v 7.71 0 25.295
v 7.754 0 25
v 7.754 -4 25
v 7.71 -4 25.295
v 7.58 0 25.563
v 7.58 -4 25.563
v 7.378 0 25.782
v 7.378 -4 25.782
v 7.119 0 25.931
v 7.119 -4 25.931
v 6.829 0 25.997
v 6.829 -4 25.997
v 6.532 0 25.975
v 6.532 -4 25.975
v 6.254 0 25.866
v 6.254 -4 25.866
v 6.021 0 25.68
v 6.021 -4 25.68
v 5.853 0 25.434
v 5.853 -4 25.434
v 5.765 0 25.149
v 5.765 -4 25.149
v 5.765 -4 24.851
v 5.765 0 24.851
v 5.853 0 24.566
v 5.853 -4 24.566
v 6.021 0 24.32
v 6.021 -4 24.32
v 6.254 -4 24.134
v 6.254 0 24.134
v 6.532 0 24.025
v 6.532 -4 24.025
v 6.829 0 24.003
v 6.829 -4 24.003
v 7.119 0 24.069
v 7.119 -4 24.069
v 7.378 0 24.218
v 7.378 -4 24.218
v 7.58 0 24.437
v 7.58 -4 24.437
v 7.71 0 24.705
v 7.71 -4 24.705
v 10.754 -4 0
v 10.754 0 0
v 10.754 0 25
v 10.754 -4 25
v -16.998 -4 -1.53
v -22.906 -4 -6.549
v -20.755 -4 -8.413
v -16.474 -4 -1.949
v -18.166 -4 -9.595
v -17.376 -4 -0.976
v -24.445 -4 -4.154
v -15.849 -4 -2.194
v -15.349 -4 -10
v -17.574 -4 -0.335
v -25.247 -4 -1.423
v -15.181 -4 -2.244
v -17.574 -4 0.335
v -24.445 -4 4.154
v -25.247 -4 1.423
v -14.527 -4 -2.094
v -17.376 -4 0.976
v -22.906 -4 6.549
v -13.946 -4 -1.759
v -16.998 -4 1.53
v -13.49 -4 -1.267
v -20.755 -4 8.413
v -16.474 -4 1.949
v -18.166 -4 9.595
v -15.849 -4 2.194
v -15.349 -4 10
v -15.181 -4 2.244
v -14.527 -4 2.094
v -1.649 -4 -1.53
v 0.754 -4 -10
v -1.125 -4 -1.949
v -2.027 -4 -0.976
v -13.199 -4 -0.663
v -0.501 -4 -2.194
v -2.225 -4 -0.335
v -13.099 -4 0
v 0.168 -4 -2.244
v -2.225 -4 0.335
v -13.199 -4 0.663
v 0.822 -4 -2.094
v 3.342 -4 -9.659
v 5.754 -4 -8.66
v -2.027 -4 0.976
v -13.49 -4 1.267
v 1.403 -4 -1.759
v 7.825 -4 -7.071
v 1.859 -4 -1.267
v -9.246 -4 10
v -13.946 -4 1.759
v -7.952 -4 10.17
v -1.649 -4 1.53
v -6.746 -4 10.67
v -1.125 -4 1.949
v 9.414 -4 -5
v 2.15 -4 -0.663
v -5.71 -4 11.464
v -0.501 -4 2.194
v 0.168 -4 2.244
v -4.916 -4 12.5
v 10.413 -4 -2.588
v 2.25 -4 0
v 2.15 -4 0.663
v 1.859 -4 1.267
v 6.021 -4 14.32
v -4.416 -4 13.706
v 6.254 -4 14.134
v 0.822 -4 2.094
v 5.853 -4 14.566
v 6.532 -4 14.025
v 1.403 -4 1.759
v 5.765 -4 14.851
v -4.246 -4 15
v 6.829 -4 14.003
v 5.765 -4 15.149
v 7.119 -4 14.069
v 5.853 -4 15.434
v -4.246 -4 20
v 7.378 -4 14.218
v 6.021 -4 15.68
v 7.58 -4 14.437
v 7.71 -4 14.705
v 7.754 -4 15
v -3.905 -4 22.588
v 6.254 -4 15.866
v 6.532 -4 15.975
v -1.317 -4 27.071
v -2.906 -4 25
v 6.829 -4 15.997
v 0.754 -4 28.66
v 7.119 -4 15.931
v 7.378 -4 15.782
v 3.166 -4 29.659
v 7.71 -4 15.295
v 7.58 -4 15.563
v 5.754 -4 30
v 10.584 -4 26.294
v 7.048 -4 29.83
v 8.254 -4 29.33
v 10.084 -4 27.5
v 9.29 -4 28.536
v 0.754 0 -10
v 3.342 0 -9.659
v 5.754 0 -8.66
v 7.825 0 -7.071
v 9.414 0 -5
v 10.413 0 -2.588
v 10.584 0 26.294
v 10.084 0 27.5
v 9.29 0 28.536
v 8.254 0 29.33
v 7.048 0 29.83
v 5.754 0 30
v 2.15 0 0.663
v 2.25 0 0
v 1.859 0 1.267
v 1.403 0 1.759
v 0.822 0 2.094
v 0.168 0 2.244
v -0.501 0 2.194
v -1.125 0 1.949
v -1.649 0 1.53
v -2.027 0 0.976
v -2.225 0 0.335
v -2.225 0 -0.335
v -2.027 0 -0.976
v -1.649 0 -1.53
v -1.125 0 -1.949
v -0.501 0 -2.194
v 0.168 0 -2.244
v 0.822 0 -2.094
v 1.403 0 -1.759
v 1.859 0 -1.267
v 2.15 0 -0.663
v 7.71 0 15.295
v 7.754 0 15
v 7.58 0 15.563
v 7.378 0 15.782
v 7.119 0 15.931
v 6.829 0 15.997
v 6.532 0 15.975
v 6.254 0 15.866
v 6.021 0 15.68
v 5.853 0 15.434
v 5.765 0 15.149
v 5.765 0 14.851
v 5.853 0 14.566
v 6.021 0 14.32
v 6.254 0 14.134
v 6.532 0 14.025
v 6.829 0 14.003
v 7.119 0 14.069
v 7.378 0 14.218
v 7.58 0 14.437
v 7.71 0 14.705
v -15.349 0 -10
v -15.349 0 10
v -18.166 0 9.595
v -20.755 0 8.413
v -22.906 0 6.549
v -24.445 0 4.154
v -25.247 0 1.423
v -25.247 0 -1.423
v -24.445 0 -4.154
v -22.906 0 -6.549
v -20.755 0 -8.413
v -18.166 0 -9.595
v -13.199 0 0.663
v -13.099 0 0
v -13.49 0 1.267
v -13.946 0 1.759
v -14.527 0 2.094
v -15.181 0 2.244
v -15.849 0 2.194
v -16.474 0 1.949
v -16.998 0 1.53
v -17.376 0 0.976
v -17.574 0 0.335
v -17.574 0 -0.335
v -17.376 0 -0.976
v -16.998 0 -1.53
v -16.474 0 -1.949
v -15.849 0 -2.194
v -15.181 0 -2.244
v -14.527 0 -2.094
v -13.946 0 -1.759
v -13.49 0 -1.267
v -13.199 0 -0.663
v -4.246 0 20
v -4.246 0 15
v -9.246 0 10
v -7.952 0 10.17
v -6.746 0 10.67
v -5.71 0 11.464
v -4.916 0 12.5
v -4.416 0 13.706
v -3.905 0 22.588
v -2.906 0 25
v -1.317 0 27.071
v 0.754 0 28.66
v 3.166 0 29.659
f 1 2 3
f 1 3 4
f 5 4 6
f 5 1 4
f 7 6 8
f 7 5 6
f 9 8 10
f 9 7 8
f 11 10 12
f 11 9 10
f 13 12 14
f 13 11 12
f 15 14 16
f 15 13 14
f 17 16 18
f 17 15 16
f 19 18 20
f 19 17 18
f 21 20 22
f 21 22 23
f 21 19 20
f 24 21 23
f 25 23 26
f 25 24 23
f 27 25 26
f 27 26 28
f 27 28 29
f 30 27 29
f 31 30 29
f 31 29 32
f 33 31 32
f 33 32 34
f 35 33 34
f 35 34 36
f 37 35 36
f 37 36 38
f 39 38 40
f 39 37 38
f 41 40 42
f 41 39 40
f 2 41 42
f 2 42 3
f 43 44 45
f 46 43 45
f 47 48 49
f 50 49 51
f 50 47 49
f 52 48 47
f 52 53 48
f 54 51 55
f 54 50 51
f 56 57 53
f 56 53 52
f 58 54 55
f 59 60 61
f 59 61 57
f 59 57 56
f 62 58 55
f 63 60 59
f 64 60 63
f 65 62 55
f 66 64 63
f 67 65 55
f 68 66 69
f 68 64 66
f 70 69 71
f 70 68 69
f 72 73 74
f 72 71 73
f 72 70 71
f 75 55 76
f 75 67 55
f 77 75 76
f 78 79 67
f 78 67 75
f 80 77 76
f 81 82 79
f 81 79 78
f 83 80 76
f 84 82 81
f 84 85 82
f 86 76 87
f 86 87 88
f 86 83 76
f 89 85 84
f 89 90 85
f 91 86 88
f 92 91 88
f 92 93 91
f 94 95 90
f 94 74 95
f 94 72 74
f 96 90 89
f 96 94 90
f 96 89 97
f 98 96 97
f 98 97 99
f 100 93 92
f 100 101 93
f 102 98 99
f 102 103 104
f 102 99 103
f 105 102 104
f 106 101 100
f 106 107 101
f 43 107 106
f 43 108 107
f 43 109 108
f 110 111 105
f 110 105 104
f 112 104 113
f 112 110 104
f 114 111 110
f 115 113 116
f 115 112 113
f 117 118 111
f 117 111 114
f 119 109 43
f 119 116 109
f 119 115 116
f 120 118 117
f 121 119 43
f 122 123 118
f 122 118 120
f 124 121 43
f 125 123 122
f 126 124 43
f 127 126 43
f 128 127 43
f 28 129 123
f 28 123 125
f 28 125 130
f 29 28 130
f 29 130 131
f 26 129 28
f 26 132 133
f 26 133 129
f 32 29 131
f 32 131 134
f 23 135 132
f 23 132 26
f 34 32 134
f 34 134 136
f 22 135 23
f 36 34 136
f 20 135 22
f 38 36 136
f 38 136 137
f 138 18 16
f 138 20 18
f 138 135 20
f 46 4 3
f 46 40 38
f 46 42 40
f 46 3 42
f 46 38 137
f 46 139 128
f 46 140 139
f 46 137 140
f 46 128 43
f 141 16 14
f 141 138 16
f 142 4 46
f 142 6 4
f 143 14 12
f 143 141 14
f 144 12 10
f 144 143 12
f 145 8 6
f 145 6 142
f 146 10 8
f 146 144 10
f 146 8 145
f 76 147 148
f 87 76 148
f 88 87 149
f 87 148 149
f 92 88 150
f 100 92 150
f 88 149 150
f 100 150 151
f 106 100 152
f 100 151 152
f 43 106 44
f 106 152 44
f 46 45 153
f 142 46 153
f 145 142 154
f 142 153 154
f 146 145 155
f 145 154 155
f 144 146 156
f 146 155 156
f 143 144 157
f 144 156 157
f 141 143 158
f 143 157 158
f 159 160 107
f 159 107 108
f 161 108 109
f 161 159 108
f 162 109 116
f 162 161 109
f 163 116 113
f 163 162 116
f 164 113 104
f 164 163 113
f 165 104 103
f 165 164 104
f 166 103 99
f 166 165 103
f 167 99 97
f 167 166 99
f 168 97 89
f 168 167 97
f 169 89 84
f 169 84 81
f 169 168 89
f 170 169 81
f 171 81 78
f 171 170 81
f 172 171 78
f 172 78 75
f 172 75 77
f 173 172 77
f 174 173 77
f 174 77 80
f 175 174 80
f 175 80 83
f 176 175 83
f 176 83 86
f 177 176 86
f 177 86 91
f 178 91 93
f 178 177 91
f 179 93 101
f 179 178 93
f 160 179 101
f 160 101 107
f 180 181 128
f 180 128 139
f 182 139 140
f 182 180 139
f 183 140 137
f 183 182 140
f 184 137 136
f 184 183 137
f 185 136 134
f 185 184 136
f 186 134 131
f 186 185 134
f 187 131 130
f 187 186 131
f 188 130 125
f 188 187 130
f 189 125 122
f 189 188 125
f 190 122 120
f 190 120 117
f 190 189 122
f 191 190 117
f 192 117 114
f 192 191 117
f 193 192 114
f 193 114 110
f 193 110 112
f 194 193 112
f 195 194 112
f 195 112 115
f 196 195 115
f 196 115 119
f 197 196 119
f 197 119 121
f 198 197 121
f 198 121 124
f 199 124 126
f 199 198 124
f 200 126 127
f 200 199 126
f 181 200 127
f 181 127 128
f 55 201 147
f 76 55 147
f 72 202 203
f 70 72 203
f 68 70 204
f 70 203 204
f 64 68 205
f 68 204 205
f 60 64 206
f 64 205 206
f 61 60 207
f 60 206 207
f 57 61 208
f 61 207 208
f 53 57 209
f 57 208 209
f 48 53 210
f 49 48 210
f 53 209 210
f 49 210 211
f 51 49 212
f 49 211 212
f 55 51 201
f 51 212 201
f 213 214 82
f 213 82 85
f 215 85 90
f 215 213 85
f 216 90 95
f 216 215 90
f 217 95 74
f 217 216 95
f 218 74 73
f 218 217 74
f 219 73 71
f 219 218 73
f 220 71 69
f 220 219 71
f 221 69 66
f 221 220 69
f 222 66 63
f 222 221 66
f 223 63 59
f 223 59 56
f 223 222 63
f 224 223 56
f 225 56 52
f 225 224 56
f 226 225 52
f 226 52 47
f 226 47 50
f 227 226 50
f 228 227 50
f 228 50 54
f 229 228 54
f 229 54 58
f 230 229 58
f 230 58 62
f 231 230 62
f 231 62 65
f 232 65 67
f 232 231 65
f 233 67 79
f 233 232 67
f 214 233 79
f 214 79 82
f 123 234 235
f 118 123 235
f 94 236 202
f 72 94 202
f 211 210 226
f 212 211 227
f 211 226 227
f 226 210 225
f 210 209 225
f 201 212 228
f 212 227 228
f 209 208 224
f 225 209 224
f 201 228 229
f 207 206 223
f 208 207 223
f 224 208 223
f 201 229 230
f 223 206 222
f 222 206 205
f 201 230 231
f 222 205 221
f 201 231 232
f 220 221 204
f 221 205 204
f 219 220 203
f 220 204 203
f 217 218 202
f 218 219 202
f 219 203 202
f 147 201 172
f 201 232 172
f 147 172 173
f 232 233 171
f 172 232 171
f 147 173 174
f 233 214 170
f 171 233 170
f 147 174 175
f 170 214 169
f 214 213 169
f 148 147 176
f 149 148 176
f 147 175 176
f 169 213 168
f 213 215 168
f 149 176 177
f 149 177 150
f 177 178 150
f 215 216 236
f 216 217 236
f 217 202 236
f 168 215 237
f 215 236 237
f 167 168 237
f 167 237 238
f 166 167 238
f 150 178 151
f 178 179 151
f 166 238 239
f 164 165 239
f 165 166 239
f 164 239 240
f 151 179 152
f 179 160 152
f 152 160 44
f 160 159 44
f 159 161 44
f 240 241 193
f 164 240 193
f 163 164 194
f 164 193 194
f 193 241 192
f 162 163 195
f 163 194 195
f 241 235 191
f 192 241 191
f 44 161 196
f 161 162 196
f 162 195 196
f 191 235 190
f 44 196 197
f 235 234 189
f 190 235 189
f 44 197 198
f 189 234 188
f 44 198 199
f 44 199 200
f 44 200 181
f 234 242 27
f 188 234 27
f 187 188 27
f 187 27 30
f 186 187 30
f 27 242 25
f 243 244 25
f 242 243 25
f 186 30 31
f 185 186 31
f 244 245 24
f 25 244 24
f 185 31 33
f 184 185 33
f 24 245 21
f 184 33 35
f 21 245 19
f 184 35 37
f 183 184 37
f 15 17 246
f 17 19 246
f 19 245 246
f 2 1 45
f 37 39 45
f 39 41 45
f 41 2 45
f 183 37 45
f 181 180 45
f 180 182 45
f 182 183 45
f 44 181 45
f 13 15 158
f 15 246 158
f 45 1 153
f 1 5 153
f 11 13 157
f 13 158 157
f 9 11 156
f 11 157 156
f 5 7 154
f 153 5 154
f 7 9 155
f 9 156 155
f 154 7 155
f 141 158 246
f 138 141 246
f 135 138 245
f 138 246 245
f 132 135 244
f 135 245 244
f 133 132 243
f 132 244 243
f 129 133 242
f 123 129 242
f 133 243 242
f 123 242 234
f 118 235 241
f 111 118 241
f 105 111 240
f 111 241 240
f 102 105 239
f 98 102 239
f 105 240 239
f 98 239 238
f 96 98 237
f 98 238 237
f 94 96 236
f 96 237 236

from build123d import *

# Parameters (mm, degrees)
F0_R     = 2.25
F0_R_2   = 1
F1_DEPTH = 4


with BuildPart() as f1:
    # F0 (on Front) → F1 (new body)
    with BuildSketch(Plane.XZ):
        with BuildLine():
            ThreePointArc((0.754098, -10), (7.825165, -7.071068), (10.754098, 0))
            Line((10.754098, 0), (10.754098, 10))
            Line((10.754098, 10), (10.754098, 15))
            Line((10.754098, 15), (10.754098, 25))
            ThreePointArc((10.754098, 25), (9.289631, 28.535534), (5.754098, 30))
            ThreePointArc((5.754098, 30), (-1.31697, 27.071068), (-4.245902, 20))
            Line((-4.245902, 20), (-4.245902, 15))
            ThreePointArc((-4.245902, 15), (-5.710369, 11.464466), (-9.245902, 10))
            Line((-9.245902, 10), (-15.348779, 10))
            ThreePointArc((-15.348779, 10), (-25.348779, 0), (-15.348779, -10))
            Line((-15.348779, -10), (0, -10))
            Line((0, -10), (0.754098, -10))
        make_face()
        with Locations((-15.348779, 0)):
            Circle(F0_R, mode=Mode.SUBTRACT)
        Circle(F0_R, mode=Mode.SUBTRACT)
        with Locations((6.754098, 15)):
            Circle(F0_R_2, mode=Mode.SUBTRACT)
        with Locations((6.754098, 25)):
            Circle(F0_R_2, mode=Mode.SUBTRACT)
    extrude(amount=F1_DEPTH)


solid = f1.part
